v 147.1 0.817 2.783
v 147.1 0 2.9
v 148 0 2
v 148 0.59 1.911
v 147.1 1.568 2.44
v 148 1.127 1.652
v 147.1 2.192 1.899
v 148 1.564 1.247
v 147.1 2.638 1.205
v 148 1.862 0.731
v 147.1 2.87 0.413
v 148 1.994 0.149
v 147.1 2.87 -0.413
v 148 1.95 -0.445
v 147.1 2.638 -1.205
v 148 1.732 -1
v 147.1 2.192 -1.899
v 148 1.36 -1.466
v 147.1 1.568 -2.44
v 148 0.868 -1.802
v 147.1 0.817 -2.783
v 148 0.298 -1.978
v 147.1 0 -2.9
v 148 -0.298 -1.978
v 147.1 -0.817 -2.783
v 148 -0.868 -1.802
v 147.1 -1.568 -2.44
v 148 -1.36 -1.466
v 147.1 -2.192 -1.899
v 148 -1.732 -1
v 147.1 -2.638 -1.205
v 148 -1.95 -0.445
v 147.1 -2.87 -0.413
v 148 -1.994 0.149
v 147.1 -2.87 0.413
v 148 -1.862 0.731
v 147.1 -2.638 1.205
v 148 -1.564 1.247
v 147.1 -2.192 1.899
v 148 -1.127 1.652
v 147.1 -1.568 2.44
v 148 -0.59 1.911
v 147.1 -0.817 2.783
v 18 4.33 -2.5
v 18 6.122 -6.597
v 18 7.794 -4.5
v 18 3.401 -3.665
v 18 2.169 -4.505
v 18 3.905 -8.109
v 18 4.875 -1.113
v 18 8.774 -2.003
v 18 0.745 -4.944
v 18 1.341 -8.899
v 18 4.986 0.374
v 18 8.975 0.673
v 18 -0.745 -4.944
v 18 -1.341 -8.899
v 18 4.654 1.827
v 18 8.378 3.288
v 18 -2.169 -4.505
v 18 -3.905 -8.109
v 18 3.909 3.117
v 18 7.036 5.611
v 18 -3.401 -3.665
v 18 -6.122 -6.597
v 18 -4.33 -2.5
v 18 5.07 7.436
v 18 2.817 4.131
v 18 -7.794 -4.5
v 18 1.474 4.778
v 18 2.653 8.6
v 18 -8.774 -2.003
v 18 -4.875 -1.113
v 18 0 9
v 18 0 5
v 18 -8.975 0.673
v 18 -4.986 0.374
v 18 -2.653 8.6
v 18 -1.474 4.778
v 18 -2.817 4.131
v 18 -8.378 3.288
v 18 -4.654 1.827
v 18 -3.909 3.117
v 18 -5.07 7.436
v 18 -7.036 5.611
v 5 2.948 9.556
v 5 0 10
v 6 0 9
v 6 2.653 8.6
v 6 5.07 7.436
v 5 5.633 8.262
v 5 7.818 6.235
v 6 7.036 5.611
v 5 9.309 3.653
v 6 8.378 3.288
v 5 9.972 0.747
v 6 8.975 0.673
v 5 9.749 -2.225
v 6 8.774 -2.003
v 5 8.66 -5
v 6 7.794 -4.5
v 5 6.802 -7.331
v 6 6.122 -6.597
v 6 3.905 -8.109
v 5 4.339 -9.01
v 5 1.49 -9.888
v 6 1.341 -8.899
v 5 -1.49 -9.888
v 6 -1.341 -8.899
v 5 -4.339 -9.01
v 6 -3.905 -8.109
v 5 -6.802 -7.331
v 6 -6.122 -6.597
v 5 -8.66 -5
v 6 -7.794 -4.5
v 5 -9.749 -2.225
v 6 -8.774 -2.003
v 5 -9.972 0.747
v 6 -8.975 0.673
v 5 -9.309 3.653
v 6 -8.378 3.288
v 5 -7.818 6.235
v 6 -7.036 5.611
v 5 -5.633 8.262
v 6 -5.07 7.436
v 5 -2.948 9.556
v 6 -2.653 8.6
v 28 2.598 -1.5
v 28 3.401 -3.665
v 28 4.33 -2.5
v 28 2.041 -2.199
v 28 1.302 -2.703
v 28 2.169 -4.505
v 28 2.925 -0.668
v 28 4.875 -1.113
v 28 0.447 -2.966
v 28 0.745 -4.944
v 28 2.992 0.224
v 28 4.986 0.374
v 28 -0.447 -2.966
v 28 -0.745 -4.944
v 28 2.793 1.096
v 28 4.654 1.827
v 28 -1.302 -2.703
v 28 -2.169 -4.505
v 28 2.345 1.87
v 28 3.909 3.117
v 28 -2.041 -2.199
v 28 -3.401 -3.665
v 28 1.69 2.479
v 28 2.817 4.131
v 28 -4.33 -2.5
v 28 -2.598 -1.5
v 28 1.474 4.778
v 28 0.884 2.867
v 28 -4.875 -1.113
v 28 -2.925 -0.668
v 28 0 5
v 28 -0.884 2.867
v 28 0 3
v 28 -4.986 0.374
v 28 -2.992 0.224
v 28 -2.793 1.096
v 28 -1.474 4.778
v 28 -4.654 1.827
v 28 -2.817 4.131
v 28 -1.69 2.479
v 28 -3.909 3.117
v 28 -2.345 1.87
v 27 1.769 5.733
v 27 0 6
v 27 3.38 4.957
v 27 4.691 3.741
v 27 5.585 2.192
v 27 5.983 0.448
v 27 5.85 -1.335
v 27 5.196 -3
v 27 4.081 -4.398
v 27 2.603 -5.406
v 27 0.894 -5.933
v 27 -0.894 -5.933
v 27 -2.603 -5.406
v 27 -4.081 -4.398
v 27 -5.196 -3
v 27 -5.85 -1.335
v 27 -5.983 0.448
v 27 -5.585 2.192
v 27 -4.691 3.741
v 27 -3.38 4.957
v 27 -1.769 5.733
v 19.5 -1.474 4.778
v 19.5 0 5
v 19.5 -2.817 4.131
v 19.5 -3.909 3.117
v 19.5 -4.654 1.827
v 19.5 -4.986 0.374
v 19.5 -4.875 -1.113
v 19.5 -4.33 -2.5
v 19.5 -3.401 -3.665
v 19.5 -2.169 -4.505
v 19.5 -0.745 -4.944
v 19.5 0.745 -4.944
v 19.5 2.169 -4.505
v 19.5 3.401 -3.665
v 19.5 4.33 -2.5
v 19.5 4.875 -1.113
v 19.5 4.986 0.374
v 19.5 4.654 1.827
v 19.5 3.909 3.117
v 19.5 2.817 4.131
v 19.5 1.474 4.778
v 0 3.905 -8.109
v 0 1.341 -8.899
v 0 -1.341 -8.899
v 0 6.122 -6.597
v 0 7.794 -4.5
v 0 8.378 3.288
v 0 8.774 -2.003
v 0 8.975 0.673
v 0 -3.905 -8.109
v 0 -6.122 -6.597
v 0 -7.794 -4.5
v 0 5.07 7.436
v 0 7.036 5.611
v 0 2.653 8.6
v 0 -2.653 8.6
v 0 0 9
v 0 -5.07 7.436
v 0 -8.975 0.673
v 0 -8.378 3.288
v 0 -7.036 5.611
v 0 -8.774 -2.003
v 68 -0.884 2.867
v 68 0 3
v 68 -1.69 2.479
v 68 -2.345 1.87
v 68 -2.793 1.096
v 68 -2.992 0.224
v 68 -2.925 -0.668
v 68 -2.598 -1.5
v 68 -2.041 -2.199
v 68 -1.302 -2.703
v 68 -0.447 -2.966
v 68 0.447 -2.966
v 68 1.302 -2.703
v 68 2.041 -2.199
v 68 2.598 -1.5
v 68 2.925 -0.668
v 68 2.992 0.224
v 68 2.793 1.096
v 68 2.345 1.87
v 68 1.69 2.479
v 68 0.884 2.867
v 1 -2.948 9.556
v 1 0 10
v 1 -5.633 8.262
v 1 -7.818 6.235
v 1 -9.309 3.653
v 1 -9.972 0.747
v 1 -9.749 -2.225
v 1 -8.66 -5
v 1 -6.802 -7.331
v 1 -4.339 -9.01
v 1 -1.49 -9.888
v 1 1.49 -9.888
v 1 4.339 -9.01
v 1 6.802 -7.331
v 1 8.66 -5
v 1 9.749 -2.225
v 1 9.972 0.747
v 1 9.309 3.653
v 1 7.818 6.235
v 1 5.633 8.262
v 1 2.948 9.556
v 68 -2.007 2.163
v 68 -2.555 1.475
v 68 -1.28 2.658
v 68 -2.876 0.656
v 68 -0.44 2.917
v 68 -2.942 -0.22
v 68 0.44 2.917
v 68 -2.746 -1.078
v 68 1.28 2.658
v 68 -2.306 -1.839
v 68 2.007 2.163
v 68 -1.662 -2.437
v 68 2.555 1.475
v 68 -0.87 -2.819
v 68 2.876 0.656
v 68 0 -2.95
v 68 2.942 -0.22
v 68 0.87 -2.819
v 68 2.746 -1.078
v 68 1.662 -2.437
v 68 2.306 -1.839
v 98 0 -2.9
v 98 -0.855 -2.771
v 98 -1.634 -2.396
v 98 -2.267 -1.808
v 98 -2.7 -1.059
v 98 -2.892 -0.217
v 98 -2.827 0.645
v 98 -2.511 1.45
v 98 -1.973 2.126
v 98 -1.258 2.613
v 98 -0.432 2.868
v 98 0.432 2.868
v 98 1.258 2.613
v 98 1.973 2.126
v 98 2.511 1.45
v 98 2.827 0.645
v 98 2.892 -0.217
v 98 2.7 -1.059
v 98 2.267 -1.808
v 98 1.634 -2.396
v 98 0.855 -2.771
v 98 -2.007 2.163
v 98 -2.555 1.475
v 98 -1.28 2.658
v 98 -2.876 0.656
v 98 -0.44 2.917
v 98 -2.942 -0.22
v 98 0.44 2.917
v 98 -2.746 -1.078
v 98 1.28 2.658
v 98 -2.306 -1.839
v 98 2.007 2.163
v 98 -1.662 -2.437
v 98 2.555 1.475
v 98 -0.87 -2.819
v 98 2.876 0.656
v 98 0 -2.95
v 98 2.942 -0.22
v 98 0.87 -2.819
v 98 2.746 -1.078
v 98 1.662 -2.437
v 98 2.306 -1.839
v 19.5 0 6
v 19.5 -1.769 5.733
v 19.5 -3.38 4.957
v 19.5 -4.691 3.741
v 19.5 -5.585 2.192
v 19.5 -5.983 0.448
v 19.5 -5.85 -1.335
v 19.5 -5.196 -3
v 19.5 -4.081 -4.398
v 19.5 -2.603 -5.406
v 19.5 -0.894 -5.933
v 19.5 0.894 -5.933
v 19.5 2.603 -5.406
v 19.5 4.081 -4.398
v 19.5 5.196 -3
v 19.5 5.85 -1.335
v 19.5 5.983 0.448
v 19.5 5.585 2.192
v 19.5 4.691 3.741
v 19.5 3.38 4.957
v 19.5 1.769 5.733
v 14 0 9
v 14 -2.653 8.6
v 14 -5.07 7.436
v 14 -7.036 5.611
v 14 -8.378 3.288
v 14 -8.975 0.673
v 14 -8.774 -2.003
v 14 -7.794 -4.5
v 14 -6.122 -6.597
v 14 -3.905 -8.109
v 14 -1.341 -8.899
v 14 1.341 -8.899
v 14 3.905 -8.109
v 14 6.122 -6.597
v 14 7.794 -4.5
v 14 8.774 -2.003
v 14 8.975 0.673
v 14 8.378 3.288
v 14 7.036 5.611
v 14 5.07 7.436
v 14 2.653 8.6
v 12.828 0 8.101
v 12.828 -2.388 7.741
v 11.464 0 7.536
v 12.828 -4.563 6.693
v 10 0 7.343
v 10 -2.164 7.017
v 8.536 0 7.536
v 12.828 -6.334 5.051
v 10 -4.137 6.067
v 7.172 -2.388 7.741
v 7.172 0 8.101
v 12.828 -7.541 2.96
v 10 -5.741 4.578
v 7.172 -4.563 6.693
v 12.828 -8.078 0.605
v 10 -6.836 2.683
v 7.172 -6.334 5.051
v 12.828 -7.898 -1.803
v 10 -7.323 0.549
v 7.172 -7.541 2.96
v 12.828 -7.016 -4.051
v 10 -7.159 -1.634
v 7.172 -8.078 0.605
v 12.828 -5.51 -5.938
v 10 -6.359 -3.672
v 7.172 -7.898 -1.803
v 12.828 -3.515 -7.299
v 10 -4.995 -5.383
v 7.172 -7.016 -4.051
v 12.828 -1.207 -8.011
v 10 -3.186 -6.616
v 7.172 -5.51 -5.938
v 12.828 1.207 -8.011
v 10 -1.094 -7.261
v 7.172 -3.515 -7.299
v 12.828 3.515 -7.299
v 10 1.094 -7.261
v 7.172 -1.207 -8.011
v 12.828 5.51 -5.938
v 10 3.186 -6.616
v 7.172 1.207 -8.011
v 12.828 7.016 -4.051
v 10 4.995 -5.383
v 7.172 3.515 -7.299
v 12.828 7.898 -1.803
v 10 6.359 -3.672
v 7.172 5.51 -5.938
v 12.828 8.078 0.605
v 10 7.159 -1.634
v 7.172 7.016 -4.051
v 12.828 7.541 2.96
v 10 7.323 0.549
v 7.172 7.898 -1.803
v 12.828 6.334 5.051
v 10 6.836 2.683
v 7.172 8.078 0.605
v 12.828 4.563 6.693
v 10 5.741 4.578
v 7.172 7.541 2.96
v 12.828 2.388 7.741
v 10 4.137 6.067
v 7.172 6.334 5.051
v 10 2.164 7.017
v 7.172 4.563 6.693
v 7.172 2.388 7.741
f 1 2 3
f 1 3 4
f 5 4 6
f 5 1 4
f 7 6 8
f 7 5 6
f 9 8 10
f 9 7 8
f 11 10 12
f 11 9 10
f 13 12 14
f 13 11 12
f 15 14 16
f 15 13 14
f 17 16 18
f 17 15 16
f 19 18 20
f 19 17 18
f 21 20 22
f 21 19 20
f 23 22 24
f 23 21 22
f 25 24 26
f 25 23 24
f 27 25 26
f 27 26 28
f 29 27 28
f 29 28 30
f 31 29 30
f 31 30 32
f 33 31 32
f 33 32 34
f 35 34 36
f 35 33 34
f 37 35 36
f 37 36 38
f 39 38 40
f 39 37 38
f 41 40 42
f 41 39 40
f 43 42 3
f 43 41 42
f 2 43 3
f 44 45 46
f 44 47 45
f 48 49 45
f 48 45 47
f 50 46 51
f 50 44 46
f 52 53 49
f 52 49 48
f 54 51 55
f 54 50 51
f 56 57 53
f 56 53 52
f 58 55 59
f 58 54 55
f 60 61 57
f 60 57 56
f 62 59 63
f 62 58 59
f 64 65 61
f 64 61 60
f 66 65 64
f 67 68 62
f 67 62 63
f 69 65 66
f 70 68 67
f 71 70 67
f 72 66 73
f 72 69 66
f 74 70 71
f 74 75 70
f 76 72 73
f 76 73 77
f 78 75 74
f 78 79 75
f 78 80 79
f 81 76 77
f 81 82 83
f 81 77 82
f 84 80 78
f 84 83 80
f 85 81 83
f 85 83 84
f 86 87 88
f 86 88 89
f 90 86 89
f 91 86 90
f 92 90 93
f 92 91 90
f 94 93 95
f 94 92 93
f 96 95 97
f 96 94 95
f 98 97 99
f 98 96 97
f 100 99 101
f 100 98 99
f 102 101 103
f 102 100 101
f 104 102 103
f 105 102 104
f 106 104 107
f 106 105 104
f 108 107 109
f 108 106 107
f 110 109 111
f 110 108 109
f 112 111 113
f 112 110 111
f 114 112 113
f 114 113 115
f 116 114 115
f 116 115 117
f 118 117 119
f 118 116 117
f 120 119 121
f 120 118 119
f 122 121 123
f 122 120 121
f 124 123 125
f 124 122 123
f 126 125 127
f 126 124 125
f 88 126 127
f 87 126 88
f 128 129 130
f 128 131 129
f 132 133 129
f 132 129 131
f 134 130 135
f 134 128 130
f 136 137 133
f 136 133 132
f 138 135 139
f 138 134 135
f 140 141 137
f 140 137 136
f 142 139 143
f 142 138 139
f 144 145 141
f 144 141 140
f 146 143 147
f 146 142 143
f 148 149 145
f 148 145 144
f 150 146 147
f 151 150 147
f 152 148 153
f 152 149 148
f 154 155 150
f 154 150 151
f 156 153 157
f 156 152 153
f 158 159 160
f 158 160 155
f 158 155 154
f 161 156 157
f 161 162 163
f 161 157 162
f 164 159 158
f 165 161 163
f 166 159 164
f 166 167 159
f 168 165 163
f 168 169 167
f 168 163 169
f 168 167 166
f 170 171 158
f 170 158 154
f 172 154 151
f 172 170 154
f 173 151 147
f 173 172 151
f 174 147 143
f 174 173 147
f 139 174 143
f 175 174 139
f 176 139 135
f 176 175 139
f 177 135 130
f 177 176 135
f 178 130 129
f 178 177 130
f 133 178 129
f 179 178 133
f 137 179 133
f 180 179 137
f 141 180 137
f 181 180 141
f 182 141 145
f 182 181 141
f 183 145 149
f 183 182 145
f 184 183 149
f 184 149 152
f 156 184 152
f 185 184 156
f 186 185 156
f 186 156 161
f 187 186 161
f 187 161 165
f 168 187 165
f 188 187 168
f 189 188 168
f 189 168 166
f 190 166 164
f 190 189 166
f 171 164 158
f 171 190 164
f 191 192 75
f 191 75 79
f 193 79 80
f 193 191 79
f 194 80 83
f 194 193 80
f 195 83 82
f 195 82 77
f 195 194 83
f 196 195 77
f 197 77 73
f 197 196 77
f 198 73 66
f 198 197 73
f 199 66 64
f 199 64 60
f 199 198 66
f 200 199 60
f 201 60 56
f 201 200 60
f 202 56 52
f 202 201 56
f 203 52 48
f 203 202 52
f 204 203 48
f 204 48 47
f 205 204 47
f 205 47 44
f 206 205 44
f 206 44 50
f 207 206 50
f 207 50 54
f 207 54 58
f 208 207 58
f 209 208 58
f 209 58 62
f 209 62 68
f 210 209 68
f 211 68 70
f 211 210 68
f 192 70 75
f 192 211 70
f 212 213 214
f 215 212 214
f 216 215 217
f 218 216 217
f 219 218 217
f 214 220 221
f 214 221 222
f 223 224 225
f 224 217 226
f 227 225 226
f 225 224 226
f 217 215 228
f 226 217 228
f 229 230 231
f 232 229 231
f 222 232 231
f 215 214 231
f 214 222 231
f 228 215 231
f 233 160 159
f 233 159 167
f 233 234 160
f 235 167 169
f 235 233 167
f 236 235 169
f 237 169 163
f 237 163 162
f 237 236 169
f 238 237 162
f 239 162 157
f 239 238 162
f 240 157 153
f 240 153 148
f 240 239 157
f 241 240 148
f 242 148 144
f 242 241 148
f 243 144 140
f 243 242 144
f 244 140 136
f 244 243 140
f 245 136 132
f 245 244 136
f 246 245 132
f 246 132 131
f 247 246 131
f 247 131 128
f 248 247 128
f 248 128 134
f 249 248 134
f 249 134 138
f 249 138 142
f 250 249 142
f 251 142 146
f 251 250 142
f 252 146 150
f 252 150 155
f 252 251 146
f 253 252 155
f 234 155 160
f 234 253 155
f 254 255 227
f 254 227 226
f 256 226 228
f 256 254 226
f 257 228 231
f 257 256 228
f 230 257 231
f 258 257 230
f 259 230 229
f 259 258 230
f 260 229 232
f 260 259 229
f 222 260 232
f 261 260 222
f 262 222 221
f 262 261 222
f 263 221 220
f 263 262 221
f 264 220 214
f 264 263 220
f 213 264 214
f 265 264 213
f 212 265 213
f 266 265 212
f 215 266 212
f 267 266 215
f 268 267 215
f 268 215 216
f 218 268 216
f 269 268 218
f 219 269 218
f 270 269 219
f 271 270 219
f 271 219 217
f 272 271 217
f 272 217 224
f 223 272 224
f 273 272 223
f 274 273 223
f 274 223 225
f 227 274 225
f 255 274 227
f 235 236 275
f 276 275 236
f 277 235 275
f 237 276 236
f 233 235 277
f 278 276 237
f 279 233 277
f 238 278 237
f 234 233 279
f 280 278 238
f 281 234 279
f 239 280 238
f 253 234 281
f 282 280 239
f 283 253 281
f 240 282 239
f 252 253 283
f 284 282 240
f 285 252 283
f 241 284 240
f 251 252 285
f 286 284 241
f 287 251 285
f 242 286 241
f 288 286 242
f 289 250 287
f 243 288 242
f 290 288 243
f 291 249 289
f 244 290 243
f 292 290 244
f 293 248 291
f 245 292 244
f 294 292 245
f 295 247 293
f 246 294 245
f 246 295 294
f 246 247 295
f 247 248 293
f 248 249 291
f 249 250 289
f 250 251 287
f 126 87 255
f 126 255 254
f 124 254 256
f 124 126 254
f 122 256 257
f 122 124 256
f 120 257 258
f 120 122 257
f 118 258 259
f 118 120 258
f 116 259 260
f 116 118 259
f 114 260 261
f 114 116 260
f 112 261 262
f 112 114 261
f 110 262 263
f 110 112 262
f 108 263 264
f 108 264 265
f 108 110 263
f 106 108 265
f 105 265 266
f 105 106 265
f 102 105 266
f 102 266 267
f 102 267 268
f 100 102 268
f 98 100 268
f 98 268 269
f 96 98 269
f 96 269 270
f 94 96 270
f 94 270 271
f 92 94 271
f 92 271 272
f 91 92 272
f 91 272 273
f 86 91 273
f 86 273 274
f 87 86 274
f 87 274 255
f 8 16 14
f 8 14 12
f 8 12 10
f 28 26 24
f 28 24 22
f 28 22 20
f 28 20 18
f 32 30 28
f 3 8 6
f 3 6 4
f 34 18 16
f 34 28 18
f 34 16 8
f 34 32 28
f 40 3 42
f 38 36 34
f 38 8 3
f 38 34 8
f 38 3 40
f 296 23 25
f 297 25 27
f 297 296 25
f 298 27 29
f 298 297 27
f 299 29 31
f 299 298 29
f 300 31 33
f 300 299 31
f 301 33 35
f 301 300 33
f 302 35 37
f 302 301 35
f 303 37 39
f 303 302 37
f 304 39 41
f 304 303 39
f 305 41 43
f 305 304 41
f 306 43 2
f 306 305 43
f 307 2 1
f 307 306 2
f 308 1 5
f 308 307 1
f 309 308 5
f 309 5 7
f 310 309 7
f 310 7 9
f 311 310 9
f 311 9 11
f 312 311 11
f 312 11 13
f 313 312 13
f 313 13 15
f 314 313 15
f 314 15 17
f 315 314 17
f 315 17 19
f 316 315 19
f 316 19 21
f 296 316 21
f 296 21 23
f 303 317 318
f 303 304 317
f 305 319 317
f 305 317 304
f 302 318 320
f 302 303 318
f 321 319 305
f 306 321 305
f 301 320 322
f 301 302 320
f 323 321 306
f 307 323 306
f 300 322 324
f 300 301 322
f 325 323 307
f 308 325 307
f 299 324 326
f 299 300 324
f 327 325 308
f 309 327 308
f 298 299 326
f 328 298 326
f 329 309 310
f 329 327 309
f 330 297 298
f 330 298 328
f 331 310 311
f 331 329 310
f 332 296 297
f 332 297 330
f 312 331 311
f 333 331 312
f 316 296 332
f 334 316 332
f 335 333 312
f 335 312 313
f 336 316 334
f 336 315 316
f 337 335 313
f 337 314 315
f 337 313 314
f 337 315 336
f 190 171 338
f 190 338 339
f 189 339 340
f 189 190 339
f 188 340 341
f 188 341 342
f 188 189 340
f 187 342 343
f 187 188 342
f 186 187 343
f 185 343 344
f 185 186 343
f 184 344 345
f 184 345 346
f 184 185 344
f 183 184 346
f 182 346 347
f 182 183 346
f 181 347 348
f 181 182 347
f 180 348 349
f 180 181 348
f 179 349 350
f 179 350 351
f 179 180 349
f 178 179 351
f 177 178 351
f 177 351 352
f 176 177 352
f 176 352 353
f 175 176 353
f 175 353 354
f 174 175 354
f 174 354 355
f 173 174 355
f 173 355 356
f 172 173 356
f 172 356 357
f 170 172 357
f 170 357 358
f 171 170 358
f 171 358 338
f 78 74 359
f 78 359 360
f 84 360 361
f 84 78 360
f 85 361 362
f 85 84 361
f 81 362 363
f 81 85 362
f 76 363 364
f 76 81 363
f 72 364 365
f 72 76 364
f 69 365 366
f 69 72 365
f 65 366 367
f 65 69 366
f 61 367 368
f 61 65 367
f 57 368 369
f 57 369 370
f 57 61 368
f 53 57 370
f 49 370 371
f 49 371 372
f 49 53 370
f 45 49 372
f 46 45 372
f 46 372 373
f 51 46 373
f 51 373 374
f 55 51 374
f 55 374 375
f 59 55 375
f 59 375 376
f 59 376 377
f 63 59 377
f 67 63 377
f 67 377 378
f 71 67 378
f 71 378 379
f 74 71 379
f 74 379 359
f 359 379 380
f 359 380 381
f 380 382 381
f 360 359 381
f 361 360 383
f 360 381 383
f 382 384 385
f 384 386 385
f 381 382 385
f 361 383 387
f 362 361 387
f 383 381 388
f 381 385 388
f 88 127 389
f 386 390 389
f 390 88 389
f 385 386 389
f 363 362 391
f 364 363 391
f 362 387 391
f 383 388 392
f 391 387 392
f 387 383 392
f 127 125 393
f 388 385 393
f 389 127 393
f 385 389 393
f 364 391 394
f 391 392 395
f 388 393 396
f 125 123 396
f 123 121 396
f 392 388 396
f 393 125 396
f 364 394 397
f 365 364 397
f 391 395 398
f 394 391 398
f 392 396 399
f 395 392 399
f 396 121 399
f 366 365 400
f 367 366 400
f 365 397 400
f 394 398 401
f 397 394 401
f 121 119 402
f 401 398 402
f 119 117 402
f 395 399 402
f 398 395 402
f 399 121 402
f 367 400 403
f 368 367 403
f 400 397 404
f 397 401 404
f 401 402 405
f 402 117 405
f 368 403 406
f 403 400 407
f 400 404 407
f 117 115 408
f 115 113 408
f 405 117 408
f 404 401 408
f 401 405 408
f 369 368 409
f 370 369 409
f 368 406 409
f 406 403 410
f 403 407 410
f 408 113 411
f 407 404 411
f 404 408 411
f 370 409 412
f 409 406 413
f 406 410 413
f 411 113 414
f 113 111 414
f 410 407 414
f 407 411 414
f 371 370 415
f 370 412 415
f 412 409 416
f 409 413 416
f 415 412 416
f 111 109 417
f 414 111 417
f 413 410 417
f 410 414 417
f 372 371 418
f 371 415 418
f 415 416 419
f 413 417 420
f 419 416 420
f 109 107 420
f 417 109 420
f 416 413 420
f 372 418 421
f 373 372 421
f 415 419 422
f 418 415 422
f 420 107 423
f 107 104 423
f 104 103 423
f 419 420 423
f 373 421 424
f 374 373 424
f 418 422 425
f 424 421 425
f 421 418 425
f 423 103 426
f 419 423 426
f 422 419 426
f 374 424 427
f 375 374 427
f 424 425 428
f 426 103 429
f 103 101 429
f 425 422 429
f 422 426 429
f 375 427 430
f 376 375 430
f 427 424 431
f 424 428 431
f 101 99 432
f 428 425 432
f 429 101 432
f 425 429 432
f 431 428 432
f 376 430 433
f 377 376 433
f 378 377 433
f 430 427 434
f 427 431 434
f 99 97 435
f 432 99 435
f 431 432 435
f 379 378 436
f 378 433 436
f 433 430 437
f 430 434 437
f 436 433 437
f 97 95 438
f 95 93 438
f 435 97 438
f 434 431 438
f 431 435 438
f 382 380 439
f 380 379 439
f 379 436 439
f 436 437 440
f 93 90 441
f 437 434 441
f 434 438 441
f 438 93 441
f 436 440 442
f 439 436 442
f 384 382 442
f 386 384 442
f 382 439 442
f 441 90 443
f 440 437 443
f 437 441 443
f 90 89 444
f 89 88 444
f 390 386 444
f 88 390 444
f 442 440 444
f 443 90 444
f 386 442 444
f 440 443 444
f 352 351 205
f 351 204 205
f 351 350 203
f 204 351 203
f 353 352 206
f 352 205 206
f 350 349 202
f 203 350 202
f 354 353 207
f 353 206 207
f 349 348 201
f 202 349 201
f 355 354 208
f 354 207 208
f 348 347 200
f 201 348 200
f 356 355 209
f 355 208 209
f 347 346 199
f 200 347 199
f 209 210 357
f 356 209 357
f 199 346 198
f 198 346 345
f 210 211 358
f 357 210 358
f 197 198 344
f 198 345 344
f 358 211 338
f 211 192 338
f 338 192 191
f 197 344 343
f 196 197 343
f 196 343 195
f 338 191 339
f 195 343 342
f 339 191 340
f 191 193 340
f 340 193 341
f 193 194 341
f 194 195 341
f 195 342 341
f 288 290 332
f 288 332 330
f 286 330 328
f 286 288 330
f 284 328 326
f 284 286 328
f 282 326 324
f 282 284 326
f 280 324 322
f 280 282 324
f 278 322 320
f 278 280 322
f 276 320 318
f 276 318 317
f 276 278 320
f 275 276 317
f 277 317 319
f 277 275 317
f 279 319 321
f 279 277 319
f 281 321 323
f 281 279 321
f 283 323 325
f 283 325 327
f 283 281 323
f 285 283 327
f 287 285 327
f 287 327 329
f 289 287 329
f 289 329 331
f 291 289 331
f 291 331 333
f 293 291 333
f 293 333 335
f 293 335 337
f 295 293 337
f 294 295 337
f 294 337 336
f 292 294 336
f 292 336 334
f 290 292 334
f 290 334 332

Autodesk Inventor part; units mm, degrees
ref_plane "YZ Plane" through (0, 0, 0) normal (1, 0, 0) x (0, 1, 0)
sketch "草图1" plane through (0, 0, 0) normal (0, 1, 0) x (-1, 0, 0)
  line L0 (0, 0) -> (0, 9)
  line L1 (0, 9) -> (-1, 10)
  line L2 (-1, 10) -> (-5, 10)
  line L3 (-5, 10) -> (-6, 9)
  line L4 (29.6, 0) -> (-177.6, 0) projected
  arc A0 (-14, 9) -> (-6, 9) centre (-10, 13) ccw
  line L5 (-14, 9) -> (-18, 9)
  line L6 (-18, 9) -> (-18, 5)
  line L7 (-18, 5) -> (-19.5, 5)
  line L8 (-19.5, 5) -> (-19.5, 6)
  line L9 (-19.5, 6) -> (-27, 6)
  line L10 (-27, 6) -> (-28, 5)
  line L11 (-28, 5) -> (-28, 3)
  line L12 (-28, 3) -> (-147, 3)
  line L13 (0, 0) -> (-118, 0)
  line L14 (-147, 3) -> (-148, 2)
  line L15 (-148, 2) -> (-148, 0)
  dimension "d0" = 10
  dimension "d4" = 45
  dimension "d5" = 1
  dimension "d6" = 45
  dimension "d7" = 1
  dimension "d8" = 6
  dimension "d9" = 6
  dimension "d10" = 45
  dimension "d11" = 1
  dimension "d12" = 3
  dimension "d13" = 4
  dimension "d14" = 10
  dimension "d16" = 28
  dimension "d17" = 9
  dimension "d18" = 1.5
  dimension "d19" = 1
  dimension "d21" = 45
  dimension "d22" = 1
  dimension "d23" = 130
revolve "旋转1" add sketch "草图1" angle 360 about axis through (-10, 0, 0) along (1, 0, 0)
thread "螺纹1" size "M12x1" class "4g6g" standard "GB Metric profile" full length
ref_plane "工作平面1" through (98, 0, 0) normal (1, 0, 0) x (0, 0, -1)
sketch "草图2" plane through (98, 0, 0) normal (1, 0, 0) x (0, 0, -1)
  circle A0 centre (0, 0) radius 2.9
  circle A1 centre (0, 0) radius 3
  dimension "d27" = 5.8
  dimension "d30" = 6
extrude "拉伸1" cut sketch "草图2" along normal through all
ref_plane "工作平面2" through (68, 0, 0) normal (1, 0, 0) x (0, 0, -1)
sketch "草图3" plane through (68, 0, 0) normal (1, 0, 0) x (0, 0, -1)
  circle A0 centre (0, 0) radius 2.95
  circle A1 centre (0, 0) radius 3
  dimension "d32" = 5.9
  dimension "d33" = 6
extrude "拉伸2" cut sketch "草图3" along normal through all
equation "\"d0\" = 0.5 * D"
equation "\"d8\" = b"
equation "\"d9\" = 0.5 * Md"
equation "\"d12\" = 0.5 * d3"
equation "\"d13\" = c_"
equation "\"d14\" = a"
equation "\"d16\" = h_"
equation "\"d23\" = L"
equation "\"d1\" = 4"
equation "\"d2\" = 12"
equation "\"d3\" = 6"
equation "\"h_\" = 28"
equation "\"a\" = 10"
equation "\"b\" = 6"
equation "\"c_\" = 4"
equation "\"D1\" = 16"
equation "\"Md\" = 12"
equation "\"L\" = 130"
equation "\"D\" = 20"
properties part number "杆式油标" material "钢，软"
